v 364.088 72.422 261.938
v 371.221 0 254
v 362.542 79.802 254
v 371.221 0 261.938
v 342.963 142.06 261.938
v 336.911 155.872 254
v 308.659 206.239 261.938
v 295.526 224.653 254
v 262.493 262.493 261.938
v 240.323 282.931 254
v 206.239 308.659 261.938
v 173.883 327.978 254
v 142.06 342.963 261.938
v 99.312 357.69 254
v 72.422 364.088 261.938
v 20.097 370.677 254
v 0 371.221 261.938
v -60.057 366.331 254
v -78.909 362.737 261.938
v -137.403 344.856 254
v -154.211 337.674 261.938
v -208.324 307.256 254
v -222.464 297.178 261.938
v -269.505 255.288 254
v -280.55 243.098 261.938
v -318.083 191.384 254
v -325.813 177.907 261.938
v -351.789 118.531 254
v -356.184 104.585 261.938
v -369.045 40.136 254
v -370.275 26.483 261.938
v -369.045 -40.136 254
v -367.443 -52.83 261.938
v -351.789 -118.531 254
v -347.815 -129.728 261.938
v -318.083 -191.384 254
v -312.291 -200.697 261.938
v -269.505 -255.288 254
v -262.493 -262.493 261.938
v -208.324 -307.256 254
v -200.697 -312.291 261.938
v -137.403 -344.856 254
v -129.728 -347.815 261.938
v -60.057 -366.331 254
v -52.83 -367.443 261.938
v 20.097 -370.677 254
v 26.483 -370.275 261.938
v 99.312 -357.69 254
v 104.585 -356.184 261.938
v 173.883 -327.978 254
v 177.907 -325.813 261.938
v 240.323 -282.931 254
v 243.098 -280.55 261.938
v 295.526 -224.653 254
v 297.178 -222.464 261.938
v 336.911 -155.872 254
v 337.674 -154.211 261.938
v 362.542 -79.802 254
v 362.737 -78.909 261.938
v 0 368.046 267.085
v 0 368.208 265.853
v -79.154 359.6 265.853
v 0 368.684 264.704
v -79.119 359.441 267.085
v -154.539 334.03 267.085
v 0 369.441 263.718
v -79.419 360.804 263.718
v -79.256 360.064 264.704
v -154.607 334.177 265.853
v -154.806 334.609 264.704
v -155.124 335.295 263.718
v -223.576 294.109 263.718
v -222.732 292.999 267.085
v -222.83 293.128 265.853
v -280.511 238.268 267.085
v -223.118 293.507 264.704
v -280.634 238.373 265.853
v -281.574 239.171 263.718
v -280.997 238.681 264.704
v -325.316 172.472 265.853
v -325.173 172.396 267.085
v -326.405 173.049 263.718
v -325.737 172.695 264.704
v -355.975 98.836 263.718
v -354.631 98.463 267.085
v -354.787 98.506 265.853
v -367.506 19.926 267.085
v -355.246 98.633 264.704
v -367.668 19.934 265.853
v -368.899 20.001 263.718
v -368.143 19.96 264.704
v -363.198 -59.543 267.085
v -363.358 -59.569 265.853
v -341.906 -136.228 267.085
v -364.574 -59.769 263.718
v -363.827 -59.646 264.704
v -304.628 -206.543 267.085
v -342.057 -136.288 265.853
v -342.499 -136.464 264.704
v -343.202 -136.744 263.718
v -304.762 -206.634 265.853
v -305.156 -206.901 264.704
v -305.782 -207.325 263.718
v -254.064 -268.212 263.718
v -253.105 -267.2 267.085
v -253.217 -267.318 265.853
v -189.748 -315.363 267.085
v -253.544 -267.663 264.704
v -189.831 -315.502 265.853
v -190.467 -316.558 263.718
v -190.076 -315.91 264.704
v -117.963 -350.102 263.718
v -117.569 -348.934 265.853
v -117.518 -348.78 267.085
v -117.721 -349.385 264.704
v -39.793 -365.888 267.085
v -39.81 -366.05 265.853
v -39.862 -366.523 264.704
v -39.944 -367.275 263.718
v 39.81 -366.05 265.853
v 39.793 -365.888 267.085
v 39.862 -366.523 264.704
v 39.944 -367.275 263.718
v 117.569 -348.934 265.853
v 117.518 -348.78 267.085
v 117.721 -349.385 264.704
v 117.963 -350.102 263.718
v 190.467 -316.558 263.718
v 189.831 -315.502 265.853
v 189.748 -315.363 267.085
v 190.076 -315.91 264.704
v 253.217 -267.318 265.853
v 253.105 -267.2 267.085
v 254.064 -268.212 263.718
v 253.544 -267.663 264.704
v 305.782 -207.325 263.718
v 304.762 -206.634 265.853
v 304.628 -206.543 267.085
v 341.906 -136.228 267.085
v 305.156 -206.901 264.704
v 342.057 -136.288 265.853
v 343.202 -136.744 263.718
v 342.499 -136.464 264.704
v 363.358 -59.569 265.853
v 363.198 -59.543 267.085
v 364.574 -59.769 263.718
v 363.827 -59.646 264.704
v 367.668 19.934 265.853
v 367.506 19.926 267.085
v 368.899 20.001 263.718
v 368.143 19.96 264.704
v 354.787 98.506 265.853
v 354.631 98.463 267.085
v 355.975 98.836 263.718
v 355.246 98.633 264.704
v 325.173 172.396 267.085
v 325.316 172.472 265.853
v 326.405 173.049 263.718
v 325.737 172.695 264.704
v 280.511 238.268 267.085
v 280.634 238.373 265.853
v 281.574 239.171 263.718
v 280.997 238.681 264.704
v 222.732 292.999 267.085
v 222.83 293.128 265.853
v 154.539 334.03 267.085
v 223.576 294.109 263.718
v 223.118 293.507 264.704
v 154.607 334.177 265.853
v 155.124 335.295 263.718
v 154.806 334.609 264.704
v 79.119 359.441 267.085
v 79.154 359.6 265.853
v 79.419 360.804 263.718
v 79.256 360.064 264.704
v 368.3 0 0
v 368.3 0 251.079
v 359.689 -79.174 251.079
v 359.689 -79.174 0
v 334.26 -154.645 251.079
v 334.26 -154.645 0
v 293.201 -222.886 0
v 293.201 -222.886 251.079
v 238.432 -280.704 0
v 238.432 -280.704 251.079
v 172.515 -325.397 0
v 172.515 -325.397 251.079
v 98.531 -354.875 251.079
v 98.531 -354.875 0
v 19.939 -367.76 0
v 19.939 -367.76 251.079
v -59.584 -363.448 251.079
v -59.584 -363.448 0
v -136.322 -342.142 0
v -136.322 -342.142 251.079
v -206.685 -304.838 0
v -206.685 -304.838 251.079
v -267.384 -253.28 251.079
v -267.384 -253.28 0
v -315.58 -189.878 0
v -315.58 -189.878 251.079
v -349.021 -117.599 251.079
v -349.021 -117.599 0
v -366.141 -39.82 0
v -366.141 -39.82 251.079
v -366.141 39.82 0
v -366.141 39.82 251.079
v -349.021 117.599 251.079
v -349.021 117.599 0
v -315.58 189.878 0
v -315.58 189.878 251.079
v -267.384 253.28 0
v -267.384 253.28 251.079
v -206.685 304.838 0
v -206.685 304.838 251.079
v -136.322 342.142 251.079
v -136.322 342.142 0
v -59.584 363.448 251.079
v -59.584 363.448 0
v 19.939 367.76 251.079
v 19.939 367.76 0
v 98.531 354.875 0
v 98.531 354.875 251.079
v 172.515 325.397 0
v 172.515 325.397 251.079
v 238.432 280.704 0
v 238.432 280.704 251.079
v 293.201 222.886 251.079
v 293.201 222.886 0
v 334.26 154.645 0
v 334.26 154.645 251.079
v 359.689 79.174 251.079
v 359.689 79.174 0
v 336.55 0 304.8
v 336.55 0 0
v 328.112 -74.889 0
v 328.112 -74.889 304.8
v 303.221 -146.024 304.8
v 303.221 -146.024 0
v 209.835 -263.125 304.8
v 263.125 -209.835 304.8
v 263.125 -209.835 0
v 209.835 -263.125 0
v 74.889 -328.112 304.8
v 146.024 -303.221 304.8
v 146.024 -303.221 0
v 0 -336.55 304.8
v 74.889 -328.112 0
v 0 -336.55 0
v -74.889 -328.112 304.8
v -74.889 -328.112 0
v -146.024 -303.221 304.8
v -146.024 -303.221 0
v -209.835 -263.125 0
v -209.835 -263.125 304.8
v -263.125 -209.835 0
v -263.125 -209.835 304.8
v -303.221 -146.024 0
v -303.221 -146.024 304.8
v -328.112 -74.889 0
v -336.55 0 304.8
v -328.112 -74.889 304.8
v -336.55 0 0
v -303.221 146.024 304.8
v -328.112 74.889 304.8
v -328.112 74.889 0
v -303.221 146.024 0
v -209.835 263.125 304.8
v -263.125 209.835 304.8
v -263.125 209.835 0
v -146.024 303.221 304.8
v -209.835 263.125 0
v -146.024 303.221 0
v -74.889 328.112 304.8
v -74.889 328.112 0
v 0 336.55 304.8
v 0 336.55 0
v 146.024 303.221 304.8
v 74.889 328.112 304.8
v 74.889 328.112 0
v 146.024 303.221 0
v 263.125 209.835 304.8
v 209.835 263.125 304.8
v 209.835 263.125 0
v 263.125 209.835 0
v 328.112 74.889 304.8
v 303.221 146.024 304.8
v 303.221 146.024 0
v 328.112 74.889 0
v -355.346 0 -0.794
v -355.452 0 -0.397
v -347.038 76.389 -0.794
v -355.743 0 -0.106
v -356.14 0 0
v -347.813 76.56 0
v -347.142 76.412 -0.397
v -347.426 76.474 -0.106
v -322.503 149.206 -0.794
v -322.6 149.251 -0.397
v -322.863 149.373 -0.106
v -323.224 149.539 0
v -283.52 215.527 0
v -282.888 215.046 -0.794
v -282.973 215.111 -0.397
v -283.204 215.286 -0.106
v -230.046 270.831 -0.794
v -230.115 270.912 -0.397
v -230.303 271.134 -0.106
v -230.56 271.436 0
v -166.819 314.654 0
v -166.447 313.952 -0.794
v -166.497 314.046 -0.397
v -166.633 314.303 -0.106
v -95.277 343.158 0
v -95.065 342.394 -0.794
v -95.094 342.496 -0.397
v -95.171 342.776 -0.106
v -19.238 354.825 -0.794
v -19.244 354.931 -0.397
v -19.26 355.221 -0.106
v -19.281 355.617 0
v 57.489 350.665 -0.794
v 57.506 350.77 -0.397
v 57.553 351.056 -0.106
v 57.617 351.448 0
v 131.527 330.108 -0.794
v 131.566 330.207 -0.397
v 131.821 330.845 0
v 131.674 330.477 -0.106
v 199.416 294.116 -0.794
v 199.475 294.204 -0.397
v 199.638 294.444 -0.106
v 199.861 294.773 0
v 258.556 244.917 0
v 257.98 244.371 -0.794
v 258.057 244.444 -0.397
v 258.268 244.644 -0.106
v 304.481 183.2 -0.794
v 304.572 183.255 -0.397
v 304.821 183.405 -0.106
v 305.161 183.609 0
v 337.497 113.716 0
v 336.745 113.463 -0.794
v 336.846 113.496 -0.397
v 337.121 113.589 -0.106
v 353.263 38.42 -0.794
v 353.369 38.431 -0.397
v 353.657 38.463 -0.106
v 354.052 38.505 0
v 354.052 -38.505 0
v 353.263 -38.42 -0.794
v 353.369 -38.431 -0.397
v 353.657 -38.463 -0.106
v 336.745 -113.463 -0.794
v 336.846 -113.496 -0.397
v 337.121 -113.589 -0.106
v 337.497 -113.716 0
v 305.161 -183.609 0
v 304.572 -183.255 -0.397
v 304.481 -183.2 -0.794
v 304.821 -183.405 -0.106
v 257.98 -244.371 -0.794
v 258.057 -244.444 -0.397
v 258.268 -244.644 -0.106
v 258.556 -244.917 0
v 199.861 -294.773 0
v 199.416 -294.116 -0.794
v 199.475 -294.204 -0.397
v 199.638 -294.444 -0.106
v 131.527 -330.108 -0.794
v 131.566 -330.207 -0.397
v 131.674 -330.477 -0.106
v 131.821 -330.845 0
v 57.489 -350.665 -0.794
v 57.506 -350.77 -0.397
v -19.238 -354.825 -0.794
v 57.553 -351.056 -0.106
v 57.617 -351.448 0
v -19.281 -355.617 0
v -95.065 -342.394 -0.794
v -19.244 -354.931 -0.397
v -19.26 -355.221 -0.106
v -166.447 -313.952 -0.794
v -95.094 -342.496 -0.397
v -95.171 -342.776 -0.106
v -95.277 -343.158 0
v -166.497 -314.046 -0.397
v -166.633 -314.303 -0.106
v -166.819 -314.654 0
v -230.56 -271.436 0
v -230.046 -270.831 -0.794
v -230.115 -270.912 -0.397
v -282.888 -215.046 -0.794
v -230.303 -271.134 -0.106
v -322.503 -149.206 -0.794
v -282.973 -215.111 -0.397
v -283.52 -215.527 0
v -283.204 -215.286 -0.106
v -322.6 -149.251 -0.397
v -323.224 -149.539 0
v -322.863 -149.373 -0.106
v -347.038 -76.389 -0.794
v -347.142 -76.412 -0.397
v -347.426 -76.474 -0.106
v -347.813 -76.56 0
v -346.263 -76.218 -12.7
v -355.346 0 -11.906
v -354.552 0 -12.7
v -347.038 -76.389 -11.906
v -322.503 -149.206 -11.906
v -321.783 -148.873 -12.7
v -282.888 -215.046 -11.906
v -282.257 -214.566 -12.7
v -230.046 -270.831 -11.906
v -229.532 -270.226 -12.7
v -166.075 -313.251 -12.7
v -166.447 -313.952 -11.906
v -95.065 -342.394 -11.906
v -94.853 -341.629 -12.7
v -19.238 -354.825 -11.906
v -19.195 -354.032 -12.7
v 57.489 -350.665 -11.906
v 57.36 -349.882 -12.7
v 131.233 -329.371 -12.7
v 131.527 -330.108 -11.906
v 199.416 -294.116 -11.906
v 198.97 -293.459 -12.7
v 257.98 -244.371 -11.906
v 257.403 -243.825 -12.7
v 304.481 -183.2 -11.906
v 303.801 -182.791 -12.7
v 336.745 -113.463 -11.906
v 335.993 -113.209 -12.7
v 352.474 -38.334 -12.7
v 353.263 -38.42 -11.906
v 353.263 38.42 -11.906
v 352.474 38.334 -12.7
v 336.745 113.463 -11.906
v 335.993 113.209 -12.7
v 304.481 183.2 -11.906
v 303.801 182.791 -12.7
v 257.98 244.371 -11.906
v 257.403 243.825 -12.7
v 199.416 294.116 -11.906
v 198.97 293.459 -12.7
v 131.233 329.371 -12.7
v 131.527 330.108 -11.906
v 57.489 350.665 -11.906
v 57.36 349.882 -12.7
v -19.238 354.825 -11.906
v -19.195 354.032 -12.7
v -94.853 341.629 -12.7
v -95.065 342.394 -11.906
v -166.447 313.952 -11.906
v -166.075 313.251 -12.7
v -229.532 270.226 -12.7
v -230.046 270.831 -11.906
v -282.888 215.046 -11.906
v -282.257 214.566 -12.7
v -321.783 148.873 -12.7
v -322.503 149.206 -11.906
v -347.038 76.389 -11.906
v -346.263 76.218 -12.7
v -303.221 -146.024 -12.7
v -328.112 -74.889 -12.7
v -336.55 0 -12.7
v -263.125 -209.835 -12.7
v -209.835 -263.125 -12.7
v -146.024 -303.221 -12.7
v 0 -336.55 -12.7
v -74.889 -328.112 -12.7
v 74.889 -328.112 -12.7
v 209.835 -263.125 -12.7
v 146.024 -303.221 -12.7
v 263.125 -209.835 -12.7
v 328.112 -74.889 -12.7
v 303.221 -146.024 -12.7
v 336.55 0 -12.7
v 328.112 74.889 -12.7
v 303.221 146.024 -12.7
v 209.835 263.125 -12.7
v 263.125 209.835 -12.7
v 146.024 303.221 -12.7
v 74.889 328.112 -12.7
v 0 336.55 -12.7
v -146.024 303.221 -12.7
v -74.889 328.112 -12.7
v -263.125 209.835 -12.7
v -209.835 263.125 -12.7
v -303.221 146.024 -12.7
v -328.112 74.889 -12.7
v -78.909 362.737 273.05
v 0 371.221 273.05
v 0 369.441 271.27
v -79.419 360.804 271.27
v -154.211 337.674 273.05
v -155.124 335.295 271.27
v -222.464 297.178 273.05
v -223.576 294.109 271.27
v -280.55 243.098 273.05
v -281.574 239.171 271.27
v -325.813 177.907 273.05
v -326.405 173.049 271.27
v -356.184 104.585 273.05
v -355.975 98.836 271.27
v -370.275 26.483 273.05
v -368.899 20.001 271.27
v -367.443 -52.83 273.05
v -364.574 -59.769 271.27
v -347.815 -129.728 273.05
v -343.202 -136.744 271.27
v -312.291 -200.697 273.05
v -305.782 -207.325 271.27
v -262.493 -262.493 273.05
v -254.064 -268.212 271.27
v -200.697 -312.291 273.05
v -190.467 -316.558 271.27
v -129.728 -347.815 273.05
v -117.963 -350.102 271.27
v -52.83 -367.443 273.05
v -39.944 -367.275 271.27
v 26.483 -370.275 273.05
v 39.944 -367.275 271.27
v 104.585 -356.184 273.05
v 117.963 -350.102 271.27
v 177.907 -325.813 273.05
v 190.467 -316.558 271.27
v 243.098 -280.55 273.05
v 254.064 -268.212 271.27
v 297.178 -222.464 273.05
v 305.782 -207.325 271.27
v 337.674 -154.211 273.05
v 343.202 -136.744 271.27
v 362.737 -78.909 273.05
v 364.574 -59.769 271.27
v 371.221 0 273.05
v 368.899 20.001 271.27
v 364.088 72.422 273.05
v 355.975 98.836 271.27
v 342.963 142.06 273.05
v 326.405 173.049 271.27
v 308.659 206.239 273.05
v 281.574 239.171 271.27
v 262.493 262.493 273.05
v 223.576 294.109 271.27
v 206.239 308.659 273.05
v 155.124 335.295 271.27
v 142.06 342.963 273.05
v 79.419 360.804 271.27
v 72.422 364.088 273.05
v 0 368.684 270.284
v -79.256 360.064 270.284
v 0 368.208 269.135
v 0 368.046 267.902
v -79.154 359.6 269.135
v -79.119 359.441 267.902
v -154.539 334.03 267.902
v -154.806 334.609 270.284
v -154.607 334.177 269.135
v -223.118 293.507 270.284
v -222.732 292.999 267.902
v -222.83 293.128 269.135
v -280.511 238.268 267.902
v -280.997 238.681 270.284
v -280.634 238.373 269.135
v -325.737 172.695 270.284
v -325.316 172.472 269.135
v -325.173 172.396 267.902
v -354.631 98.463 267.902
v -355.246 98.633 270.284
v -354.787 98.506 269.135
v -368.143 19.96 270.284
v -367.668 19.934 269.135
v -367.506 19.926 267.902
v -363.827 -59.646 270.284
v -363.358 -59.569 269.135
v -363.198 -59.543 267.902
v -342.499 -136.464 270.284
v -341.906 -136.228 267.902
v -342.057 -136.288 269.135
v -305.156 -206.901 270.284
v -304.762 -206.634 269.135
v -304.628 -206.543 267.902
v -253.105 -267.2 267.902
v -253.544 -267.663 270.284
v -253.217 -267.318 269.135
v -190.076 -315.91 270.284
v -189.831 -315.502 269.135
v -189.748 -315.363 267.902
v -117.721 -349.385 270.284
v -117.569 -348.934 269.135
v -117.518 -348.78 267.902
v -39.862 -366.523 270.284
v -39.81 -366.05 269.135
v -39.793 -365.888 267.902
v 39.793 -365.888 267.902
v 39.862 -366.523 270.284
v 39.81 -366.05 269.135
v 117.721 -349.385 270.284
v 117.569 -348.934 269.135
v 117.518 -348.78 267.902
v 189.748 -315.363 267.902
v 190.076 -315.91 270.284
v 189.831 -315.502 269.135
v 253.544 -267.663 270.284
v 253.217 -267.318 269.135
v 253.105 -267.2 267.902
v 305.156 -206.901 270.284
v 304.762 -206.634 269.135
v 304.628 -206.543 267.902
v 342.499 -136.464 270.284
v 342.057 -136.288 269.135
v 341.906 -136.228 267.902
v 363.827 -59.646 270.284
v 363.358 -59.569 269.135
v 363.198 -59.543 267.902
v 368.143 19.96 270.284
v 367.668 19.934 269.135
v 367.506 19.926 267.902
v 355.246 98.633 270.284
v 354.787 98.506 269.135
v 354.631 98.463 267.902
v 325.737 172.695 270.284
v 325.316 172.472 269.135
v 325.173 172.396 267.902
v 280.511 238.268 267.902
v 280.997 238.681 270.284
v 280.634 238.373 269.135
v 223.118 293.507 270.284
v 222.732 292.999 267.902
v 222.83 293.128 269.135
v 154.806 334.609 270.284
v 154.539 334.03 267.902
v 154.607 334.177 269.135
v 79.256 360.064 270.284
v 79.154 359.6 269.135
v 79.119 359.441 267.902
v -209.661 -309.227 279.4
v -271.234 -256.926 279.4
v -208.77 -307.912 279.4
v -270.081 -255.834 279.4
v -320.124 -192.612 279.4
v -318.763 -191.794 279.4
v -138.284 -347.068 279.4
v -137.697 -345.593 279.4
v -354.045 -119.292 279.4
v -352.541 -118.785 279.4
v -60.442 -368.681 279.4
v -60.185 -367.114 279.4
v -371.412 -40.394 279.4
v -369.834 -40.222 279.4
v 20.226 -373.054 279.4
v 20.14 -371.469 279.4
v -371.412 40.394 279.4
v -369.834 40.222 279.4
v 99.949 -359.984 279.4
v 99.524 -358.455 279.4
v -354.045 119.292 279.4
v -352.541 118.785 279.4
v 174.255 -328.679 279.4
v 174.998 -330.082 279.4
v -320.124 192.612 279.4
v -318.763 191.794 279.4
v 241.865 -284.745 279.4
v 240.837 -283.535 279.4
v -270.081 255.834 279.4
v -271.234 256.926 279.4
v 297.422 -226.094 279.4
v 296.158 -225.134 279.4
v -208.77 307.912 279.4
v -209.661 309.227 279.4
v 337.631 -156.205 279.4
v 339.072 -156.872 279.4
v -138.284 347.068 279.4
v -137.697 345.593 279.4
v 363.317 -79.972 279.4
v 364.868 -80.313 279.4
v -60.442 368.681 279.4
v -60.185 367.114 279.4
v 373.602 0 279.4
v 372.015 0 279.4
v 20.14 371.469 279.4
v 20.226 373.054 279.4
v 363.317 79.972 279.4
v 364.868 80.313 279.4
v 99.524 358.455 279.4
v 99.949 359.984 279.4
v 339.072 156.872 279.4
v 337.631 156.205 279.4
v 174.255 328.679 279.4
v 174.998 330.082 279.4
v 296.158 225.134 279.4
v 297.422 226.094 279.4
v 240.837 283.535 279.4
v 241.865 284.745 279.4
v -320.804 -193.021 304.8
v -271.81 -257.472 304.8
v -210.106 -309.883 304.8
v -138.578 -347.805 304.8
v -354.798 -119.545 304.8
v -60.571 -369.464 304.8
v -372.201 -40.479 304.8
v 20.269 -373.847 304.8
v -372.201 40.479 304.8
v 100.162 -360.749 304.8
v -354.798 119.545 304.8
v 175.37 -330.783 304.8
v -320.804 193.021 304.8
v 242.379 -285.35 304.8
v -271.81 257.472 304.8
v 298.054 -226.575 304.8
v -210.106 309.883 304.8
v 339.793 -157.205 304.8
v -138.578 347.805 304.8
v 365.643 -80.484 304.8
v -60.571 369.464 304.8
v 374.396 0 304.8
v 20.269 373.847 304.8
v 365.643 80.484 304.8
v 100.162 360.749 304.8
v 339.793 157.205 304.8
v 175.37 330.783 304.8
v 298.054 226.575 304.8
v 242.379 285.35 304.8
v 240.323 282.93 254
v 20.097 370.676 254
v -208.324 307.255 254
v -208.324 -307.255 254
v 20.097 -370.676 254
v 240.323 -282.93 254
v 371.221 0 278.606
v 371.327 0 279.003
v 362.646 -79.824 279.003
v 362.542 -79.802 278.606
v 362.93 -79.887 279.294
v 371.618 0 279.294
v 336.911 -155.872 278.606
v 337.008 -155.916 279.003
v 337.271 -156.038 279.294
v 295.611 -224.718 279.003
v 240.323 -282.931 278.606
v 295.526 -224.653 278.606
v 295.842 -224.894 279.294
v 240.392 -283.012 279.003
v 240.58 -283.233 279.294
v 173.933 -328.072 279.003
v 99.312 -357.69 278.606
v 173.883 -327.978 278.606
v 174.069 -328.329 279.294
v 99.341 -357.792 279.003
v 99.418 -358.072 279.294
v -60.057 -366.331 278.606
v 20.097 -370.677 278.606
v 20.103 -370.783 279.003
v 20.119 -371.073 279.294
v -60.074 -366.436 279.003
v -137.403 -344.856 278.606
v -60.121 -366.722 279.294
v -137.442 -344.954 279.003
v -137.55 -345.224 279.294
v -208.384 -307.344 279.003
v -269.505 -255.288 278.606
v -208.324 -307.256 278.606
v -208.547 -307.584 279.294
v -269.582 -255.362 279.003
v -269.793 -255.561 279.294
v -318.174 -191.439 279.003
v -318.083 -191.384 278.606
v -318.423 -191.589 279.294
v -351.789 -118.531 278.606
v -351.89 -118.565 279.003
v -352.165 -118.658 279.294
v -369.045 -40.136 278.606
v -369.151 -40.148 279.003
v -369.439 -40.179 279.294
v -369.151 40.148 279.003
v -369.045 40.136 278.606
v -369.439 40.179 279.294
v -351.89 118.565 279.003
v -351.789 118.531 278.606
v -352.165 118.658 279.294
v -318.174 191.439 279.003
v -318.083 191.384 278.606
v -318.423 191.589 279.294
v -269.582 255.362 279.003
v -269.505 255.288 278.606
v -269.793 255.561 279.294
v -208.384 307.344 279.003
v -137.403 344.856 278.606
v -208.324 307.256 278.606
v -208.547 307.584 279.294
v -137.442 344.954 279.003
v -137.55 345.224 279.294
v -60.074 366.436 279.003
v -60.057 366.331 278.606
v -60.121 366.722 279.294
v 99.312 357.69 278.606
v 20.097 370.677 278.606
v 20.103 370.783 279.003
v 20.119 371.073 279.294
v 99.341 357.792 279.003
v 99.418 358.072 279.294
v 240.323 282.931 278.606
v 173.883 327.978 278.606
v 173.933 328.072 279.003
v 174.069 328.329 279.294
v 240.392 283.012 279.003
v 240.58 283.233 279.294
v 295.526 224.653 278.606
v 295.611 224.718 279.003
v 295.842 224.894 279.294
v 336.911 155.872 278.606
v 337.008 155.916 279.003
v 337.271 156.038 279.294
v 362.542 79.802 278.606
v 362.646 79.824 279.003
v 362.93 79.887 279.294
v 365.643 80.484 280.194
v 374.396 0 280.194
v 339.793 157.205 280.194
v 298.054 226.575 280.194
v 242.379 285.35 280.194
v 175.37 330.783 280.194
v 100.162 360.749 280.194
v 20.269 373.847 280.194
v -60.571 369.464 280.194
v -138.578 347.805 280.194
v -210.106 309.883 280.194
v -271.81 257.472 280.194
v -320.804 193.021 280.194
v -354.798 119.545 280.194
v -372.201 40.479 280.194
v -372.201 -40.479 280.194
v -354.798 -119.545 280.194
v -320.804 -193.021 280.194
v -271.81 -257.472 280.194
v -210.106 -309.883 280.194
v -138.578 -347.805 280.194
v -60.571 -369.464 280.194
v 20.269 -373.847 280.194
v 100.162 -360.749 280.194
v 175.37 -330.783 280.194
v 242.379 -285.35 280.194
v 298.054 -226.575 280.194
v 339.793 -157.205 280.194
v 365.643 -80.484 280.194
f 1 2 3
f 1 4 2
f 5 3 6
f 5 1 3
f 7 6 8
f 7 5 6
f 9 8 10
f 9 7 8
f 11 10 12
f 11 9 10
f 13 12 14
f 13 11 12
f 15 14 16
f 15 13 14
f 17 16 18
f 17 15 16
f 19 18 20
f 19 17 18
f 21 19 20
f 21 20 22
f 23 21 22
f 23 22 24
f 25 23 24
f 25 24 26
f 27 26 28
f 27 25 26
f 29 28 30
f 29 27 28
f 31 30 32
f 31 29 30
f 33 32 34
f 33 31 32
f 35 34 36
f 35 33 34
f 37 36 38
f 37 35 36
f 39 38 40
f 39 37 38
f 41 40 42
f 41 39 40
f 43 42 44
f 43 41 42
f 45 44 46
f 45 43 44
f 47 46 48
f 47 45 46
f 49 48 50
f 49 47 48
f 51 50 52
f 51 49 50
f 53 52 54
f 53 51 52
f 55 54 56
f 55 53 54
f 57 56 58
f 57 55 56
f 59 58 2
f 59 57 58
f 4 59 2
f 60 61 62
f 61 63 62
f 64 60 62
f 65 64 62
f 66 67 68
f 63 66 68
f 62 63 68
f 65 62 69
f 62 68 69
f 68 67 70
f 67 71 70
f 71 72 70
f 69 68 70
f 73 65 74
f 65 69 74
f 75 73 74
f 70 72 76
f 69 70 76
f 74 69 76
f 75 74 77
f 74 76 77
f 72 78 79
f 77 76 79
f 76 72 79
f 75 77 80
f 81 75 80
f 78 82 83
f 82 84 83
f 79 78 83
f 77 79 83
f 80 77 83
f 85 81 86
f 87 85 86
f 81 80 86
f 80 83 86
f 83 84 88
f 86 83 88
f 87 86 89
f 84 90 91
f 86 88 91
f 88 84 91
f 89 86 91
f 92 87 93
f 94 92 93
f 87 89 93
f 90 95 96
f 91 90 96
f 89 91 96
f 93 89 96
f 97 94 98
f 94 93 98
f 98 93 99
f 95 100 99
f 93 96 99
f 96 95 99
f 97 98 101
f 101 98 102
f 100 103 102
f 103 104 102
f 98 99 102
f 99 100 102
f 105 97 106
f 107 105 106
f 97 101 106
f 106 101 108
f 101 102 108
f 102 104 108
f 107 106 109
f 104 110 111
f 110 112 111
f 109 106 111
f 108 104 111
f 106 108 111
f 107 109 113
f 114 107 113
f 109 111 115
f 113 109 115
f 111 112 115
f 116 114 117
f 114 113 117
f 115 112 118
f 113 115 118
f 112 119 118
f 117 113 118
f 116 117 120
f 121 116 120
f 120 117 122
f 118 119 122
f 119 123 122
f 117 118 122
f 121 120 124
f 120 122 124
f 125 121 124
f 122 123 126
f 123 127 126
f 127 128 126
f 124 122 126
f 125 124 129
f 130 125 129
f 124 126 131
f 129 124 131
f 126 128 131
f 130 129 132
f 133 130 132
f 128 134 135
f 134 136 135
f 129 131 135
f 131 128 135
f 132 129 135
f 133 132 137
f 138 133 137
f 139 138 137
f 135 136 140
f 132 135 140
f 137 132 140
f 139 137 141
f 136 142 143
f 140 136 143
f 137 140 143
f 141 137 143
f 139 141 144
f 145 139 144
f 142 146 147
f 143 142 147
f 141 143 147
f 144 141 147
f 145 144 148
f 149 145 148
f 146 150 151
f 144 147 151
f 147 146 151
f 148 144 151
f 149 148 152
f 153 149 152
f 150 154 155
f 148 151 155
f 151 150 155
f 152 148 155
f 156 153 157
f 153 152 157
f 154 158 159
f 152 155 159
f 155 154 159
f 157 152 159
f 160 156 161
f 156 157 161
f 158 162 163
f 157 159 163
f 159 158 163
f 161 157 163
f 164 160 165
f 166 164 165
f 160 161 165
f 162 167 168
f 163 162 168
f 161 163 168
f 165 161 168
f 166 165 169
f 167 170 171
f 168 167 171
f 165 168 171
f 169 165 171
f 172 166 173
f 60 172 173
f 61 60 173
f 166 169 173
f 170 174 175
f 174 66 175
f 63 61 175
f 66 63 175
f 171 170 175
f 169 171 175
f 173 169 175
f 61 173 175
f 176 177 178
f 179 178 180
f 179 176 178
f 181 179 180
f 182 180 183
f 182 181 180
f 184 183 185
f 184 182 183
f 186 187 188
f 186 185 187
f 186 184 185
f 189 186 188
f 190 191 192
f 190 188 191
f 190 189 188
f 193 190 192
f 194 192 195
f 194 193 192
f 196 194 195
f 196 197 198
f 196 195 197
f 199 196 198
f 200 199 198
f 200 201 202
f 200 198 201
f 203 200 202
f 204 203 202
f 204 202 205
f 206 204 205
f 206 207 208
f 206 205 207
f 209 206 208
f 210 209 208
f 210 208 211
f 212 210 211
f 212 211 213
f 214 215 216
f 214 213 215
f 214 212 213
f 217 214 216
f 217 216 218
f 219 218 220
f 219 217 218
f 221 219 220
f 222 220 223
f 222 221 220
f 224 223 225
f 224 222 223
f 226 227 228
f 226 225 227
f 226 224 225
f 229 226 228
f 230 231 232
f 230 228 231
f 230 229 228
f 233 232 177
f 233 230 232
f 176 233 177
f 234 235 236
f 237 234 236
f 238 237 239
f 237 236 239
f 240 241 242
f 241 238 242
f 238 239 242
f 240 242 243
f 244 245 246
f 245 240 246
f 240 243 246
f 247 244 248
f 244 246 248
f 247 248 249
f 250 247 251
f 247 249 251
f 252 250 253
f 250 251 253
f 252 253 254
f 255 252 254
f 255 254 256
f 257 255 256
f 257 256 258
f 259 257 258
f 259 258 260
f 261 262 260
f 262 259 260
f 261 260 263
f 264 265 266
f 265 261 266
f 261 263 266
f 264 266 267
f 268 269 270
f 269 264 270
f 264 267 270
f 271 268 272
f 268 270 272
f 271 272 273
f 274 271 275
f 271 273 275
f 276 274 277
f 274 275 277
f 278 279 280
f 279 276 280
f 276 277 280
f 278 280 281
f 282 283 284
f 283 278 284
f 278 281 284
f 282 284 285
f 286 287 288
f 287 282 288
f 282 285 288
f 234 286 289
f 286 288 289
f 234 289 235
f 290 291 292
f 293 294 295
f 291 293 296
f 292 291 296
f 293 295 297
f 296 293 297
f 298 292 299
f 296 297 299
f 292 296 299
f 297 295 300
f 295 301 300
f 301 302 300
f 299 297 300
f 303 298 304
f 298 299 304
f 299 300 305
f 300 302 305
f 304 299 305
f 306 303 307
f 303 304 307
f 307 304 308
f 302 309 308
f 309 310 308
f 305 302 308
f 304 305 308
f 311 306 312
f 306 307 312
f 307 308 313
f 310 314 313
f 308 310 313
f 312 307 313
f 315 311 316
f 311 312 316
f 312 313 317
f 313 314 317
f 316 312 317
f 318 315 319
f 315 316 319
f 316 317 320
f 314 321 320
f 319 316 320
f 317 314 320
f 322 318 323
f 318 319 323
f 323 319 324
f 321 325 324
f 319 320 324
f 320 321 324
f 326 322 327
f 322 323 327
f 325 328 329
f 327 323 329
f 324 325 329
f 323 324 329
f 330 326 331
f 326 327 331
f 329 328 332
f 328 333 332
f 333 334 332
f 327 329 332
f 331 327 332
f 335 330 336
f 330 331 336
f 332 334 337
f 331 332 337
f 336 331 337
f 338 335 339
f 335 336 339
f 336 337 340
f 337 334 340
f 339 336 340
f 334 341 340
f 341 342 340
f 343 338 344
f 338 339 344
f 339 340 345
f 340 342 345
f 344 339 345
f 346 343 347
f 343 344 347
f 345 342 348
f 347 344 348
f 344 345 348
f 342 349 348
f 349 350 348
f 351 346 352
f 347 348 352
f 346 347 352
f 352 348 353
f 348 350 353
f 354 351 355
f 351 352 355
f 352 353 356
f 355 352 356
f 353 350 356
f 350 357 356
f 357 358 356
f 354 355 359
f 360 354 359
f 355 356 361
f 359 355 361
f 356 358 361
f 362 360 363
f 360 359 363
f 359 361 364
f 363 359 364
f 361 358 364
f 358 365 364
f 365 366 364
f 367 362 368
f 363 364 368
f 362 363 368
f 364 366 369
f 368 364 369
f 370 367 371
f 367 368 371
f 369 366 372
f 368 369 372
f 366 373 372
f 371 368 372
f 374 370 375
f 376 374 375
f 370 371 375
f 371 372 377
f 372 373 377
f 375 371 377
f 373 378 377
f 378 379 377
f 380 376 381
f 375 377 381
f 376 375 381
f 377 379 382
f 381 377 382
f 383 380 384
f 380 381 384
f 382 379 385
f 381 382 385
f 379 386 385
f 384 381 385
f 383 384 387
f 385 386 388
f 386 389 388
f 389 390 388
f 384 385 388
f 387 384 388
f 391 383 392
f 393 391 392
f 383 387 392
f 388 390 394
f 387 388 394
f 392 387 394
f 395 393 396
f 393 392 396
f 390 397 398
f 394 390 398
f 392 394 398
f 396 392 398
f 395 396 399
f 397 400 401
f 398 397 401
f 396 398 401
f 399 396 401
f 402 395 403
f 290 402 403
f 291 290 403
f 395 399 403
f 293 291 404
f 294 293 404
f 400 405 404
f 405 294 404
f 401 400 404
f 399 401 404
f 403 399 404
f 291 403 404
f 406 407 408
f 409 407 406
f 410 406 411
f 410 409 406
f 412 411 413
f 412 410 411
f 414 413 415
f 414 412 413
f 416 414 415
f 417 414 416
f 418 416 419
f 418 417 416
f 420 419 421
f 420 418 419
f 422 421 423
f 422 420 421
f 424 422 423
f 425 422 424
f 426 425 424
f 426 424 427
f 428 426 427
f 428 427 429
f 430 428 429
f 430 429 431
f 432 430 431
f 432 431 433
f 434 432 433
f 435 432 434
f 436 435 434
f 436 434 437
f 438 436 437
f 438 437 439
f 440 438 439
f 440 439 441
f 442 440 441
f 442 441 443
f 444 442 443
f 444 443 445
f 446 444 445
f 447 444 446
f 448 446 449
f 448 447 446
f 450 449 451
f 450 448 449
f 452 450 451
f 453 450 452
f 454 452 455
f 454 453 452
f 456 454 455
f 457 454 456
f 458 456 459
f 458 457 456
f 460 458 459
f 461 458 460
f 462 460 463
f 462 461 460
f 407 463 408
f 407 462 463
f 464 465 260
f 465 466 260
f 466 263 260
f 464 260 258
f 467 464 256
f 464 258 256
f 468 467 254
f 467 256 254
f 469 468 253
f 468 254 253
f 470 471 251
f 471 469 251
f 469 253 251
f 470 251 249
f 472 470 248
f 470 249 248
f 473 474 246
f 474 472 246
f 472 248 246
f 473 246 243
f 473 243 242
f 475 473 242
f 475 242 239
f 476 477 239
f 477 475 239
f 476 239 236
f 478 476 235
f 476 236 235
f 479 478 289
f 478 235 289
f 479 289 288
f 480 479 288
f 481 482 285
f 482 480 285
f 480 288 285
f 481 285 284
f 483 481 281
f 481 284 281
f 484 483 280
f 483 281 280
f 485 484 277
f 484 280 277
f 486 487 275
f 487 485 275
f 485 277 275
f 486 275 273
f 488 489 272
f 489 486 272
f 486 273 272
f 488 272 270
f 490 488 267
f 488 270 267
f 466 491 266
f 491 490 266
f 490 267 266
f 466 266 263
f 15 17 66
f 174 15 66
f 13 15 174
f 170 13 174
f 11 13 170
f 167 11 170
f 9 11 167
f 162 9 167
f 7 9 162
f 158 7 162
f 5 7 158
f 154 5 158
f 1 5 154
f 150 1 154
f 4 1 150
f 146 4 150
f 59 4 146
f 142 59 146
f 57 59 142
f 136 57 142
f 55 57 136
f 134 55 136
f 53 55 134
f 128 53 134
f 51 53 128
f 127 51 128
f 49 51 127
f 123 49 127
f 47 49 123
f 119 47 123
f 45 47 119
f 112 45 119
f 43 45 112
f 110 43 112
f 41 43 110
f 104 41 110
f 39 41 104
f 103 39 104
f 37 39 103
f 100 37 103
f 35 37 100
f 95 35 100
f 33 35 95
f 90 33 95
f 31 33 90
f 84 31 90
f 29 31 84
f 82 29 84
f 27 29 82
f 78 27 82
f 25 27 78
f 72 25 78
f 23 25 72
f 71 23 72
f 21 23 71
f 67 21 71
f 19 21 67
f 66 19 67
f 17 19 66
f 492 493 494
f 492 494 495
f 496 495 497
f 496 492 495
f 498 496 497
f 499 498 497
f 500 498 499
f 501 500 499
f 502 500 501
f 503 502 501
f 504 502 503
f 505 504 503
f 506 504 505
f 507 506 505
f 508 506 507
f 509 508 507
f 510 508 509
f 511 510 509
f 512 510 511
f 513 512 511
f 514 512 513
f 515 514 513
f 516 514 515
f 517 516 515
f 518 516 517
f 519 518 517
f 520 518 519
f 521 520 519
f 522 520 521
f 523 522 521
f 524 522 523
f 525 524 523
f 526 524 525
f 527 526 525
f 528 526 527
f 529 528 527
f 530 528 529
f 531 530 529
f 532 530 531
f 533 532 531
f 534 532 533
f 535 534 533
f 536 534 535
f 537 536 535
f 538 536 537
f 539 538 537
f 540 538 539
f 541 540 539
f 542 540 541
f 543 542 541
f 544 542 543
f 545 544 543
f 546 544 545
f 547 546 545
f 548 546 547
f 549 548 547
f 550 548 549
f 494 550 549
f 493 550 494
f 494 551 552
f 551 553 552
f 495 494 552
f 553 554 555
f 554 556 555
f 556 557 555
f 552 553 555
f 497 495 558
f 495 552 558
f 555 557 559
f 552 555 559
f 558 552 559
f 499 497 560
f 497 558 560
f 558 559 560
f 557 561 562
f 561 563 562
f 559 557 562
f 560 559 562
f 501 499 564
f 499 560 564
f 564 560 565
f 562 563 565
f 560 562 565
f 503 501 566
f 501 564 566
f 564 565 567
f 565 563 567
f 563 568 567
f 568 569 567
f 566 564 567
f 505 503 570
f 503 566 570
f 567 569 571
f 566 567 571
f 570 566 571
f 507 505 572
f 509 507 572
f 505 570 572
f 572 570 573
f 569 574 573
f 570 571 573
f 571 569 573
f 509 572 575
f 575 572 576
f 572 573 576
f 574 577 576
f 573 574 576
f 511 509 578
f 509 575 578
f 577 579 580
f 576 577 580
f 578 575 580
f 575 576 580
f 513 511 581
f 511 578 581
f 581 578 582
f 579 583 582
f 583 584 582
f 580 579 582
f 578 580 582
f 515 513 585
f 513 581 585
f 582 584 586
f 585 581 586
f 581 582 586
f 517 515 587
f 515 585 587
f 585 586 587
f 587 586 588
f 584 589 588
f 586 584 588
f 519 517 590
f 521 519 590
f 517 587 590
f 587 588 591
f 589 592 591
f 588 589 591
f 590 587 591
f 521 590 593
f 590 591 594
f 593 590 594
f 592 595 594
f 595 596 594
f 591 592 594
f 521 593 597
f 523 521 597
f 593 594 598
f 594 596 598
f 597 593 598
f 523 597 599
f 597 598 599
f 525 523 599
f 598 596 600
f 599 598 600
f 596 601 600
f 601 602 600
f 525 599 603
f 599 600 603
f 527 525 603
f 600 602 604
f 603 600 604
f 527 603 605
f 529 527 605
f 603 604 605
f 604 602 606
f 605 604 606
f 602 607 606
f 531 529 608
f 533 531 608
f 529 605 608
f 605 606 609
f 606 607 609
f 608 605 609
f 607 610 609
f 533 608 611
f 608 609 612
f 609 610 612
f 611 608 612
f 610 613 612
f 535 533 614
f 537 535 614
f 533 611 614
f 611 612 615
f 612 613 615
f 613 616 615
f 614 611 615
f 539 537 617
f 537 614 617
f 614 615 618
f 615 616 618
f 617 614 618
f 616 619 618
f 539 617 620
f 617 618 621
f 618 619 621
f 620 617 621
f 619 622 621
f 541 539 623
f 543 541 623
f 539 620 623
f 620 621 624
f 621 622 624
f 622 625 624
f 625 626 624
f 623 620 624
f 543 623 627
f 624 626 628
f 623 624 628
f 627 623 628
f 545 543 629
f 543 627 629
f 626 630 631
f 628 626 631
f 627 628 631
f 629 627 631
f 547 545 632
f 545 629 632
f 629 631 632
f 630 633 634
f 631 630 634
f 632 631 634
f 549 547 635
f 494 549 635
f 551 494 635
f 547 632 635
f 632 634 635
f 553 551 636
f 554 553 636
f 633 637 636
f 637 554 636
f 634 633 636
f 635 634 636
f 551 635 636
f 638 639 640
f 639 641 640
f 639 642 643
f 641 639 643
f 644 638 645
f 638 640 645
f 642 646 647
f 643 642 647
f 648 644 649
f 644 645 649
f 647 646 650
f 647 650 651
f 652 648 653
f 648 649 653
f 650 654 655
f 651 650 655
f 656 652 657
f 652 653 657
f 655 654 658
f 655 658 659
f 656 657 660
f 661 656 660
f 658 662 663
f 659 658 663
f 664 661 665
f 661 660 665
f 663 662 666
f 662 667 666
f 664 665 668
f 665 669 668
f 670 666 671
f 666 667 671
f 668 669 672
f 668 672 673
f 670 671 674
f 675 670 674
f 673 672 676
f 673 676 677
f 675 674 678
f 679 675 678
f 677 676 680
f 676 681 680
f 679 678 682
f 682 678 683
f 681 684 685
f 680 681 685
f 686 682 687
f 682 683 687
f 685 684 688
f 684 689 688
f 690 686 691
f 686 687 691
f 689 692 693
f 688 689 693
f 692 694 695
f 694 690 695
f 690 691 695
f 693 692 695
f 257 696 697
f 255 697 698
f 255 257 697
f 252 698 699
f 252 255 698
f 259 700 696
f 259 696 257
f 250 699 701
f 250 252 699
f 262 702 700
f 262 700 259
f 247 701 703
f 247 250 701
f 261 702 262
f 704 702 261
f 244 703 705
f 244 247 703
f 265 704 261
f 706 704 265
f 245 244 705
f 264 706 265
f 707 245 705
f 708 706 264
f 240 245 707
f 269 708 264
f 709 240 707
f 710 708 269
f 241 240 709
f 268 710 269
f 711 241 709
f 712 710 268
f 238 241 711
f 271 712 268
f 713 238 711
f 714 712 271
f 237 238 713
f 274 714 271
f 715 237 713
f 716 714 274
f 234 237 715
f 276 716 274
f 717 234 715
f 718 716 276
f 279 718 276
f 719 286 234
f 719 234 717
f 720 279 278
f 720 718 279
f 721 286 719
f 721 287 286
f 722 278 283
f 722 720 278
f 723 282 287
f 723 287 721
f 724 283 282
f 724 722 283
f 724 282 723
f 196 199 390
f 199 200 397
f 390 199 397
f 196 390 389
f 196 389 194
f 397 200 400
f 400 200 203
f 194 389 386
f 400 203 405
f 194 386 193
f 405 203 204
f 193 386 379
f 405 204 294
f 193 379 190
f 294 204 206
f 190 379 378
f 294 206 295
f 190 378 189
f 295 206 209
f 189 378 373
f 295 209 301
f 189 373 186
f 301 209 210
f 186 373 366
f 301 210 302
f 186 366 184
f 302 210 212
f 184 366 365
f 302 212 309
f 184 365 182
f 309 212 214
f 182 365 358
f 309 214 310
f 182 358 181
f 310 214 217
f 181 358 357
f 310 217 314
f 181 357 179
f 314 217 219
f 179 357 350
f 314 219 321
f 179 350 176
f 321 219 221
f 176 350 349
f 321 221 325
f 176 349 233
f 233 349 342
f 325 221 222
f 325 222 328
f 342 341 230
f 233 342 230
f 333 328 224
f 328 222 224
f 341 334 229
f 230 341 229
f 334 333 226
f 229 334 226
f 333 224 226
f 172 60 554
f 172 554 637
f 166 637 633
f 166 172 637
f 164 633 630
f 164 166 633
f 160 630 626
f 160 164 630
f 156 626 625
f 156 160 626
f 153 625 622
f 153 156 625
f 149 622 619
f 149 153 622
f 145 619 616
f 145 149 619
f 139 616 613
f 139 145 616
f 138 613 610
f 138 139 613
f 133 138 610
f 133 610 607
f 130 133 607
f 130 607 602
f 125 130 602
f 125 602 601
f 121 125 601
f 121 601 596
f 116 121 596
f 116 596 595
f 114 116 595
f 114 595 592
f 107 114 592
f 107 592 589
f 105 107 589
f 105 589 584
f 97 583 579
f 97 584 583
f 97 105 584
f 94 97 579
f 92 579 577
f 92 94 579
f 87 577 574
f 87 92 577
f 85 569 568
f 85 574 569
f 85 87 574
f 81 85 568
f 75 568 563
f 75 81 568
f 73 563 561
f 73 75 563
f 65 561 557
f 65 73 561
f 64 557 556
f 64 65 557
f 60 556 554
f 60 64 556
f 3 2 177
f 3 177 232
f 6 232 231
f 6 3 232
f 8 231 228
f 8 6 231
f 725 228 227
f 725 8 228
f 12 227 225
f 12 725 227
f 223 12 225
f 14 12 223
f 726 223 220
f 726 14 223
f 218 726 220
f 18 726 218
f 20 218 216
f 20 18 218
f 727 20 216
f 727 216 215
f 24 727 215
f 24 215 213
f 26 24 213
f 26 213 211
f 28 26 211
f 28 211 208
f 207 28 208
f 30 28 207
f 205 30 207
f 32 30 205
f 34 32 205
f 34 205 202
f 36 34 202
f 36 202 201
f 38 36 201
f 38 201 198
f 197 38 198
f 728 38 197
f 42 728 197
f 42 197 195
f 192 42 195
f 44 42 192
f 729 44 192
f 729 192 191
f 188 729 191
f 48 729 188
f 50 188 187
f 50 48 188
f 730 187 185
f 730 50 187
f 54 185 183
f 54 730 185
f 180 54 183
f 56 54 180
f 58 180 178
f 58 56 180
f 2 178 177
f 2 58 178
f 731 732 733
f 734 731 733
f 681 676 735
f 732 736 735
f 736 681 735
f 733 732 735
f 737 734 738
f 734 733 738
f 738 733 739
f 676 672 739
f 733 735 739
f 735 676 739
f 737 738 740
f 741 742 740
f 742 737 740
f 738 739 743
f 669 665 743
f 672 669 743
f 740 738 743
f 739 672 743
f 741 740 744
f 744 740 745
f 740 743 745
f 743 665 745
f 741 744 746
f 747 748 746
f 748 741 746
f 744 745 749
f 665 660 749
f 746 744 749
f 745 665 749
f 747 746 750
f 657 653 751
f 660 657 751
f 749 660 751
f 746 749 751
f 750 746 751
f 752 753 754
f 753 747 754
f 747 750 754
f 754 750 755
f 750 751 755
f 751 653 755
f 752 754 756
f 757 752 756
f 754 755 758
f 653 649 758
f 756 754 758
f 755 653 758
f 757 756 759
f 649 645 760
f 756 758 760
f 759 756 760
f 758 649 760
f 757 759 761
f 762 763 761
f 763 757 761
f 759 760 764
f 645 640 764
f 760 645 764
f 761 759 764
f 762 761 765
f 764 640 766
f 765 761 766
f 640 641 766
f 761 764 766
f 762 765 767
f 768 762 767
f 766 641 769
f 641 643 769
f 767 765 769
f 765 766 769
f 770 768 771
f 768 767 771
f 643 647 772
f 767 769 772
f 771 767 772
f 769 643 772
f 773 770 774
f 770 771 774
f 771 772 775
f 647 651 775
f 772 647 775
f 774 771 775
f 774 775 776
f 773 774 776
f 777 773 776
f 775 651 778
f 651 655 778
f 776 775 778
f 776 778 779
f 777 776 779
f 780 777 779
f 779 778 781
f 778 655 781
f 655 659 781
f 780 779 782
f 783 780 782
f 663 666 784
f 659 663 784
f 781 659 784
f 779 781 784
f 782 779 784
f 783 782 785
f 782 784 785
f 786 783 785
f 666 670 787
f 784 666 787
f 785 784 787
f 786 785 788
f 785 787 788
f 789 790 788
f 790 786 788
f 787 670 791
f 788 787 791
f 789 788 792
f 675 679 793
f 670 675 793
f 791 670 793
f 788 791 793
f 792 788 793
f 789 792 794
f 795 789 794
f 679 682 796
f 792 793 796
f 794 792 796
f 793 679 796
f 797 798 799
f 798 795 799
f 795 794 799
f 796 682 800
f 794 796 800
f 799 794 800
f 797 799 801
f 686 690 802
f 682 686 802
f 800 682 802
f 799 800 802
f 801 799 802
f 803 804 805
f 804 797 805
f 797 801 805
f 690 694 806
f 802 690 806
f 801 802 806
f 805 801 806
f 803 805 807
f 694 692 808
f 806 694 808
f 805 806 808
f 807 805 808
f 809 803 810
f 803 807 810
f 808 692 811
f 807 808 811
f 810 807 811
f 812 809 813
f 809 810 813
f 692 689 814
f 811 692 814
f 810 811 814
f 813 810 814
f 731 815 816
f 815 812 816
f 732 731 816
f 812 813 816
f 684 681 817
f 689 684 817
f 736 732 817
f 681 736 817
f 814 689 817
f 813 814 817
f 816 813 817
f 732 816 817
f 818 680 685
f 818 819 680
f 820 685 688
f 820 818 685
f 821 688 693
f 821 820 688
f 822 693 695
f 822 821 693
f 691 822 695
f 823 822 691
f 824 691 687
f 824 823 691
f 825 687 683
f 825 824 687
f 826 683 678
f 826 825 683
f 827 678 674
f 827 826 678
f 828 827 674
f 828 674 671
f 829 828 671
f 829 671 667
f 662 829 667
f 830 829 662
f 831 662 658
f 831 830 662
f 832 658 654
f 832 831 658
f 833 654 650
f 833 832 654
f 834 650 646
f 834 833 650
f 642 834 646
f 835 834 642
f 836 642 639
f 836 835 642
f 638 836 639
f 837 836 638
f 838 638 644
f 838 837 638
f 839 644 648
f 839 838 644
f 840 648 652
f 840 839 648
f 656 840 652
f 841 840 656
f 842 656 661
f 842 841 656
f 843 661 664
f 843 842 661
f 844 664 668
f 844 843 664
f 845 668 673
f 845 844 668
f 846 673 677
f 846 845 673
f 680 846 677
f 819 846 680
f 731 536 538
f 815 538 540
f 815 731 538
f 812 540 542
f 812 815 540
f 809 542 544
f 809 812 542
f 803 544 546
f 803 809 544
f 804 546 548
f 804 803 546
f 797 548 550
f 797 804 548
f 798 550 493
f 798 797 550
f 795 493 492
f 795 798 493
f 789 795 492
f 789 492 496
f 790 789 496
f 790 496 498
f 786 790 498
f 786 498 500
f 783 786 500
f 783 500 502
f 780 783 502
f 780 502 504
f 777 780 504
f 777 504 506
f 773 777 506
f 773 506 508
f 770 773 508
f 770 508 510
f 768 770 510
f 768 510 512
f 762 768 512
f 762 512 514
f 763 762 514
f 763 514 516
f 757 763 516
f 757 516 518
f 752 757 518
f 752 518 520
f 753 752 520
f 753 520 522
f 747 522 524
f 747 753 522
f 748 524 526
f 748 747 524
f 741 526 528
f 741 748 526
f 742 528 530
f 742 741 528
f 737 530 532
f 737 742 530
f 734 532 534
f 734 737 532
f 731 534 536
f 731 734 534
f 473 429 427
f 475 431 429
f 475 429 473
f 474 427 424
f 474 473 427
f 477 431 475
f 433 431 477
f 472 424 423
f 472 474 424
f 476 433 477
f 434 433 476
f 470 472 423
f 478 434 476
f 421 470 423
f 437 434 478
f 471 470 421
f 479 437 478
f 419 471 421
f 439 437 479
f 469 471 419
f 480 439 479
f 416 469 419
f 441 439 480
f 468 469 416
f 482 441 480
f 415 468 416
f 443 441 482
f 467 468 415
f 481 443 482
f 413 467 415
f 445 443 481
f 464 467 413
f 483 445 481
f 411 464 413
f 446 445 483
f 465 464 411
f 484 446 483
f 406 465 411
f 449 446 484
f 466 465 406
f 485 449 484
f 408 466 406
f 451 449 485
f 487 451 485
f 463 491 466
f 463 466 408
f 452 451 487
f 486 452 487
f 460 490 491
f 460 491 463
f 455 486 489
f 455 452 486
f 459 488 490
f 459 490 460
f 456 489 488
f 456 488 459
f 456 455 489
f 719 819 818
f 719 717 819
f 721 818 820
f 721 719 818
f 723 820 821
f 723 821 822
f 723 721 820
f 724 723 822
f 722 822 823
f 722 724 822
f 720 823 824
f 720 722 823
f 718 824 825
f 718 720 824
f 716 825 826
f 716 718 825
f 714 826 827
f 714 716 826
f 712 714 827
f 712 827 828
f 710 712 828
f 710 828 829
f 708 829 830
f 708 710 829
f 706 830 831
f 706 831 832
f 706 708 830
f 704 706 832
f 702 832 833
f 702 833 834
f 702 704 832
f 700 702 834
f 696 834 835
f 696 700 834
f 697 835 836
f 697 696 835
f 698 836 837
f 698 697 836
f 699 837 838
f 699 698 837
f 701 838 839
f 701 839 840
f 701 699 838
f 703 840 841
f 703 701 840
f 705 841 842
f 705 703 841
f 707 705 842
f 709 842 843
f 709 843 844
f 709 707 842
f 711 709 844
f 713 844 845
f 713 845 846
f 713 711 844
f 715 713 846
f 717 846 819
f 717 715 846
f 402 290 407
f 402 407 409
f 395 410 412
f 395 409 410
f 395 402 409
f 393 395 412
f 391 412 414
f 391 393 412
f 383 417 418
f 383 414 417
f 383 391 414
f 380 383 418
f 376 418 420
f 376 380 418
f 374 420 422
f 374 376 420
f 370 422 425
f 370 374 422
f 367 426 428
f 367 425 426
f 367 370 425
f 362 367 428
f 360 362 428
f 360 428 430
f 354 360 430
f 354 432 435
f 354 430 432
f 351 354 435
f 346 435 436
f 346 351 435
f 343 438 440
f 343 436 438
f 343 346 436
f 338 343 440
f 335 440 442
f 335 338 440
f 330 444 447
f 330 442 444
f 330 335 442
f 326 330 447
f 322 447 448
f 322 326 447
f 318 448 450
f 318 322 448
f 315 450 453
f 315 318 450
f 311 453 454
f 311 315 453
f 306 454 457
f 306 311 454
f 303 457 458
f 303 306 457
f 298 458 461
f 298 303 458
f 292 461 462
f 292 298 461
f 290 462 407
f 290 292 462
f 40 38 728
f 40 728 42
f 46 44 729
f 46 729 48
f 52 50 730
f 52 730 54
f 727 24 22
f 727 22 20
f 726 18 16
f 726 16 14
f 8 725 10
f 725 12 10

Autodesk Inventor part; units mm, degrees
ref_plane "YZ Plane" through (0, 0, 0) normal (1, 0, 0) x (0, 1, 0)
ref_plane "XZ Plane" through (0, 0, 0) normal (0, 1, 0) x (-1, 0, 0)
ref_plane "XY Plane" through (0, 0, 0) normal (0, 0, 1) x (1, 0, 0)
sketch "Sketch1" plane through (0, 0, 0) normal (0, 0, 1) x (1, 0, 0)
  circle A0 centre (0, 0) radius 336.55
  circle A1 centre (0, 0) radius 368.3
  dimension "d0" = 673.1
  dimension "d1" = 736.6
extrude "Extrusion1" add sketch "Sketch1" along normal blind 304.8
sketch "Sketch2" plane through (0, 0, 304.8) normal (0, 0, 1) x (1, 0, 0)
  circle A0 centre (0, 0) radius 368.3 projected
  circle A1 centre (0, 0) radius 371.221
  circle A2 centre (0, 0) radius 374.396
  dimension "d4" = 742.442
  dimension "d5" = 748.792
extrude "Extrusion2" add sketch "Sketch2" against normal blind 50.8 contours A1
extrude "Extrusion3" add sketch "Sketch2" against normal blind 25.4 contours A2
chamfer "Chamfer1" distance 2.921 angle 45 1 edges at (-368.3, 0, 254)
sketch "Sketch3" plane through (0, 0, 0) normal (0, 0, -1) x (-1, 0, 0)
  circle A0 centre (0, 0) radius 355.346
  circle A1 centre (0, 0) radius 336.55 projected
  dimension "d13" = 710.692
extrude "Extrusion4" add sketch "Sketch3" along normal blind 12.7
fillet "Fillet1" radius 0.7937 2 edges at (355.346, 0, 0) (-371.221, 0, 279.4)
chamfer "Chamfer2" distance 0.7937 angle 45 1 edges at (355.346, 0, -12.7)
chamfer "Chamfer3" distance 0.7937 angle 45 1 edges at (-374.396, 0, 279.4)
sketch "Sketch4" plane through (0, 0, 0) normal (1, 0, 0) x (0, 1, 0)
  line L0 (371.221, 278.6063) -> (371.221, 254) construction
  line L1 (-374.396, 304.8) -> (374.396, 304.8) construction
  line L2 (371.221, 273.05) -> (369.4409, 271.2699)
  arc A0 (369.4409, 271.2699) -> (368.046, 267.9023) centre (372.8085, 267.9023) ccw
  line L3 (368.046, 267.9023) -> (368.046, 267.0852)
  arc A1 (368.046, 267.0852) -> (369.4409, 263.7176) centre (372.8085, 267.0852) ccw
  line L4 (369.4409, 263.7176) -> (371.221, 261.9375)
  line L5 (371.221, 261.9375) -> (371.221, 273.05)
  line L6 (0, -76.2) -> (0, 368.3) projected
  point P0 (0, 0)
  dimension "d23" = 11.1125
  dimension "d24" = 3.175
  dimension "d25" = 4.7625
  dimension "d26" = 31.75
  dimension "d27" = 45
revolve "Revolution1" cut sketch "Sketch4" angle 360 about axis through (0, 0, -10) along (0, 0, 1)
equation "\"d10\" = -0.5 * d1 + 0.5 * d4"
properties part number "A1-19037-100-06 HCWI liner - pup" material "Iron, HCWI"
